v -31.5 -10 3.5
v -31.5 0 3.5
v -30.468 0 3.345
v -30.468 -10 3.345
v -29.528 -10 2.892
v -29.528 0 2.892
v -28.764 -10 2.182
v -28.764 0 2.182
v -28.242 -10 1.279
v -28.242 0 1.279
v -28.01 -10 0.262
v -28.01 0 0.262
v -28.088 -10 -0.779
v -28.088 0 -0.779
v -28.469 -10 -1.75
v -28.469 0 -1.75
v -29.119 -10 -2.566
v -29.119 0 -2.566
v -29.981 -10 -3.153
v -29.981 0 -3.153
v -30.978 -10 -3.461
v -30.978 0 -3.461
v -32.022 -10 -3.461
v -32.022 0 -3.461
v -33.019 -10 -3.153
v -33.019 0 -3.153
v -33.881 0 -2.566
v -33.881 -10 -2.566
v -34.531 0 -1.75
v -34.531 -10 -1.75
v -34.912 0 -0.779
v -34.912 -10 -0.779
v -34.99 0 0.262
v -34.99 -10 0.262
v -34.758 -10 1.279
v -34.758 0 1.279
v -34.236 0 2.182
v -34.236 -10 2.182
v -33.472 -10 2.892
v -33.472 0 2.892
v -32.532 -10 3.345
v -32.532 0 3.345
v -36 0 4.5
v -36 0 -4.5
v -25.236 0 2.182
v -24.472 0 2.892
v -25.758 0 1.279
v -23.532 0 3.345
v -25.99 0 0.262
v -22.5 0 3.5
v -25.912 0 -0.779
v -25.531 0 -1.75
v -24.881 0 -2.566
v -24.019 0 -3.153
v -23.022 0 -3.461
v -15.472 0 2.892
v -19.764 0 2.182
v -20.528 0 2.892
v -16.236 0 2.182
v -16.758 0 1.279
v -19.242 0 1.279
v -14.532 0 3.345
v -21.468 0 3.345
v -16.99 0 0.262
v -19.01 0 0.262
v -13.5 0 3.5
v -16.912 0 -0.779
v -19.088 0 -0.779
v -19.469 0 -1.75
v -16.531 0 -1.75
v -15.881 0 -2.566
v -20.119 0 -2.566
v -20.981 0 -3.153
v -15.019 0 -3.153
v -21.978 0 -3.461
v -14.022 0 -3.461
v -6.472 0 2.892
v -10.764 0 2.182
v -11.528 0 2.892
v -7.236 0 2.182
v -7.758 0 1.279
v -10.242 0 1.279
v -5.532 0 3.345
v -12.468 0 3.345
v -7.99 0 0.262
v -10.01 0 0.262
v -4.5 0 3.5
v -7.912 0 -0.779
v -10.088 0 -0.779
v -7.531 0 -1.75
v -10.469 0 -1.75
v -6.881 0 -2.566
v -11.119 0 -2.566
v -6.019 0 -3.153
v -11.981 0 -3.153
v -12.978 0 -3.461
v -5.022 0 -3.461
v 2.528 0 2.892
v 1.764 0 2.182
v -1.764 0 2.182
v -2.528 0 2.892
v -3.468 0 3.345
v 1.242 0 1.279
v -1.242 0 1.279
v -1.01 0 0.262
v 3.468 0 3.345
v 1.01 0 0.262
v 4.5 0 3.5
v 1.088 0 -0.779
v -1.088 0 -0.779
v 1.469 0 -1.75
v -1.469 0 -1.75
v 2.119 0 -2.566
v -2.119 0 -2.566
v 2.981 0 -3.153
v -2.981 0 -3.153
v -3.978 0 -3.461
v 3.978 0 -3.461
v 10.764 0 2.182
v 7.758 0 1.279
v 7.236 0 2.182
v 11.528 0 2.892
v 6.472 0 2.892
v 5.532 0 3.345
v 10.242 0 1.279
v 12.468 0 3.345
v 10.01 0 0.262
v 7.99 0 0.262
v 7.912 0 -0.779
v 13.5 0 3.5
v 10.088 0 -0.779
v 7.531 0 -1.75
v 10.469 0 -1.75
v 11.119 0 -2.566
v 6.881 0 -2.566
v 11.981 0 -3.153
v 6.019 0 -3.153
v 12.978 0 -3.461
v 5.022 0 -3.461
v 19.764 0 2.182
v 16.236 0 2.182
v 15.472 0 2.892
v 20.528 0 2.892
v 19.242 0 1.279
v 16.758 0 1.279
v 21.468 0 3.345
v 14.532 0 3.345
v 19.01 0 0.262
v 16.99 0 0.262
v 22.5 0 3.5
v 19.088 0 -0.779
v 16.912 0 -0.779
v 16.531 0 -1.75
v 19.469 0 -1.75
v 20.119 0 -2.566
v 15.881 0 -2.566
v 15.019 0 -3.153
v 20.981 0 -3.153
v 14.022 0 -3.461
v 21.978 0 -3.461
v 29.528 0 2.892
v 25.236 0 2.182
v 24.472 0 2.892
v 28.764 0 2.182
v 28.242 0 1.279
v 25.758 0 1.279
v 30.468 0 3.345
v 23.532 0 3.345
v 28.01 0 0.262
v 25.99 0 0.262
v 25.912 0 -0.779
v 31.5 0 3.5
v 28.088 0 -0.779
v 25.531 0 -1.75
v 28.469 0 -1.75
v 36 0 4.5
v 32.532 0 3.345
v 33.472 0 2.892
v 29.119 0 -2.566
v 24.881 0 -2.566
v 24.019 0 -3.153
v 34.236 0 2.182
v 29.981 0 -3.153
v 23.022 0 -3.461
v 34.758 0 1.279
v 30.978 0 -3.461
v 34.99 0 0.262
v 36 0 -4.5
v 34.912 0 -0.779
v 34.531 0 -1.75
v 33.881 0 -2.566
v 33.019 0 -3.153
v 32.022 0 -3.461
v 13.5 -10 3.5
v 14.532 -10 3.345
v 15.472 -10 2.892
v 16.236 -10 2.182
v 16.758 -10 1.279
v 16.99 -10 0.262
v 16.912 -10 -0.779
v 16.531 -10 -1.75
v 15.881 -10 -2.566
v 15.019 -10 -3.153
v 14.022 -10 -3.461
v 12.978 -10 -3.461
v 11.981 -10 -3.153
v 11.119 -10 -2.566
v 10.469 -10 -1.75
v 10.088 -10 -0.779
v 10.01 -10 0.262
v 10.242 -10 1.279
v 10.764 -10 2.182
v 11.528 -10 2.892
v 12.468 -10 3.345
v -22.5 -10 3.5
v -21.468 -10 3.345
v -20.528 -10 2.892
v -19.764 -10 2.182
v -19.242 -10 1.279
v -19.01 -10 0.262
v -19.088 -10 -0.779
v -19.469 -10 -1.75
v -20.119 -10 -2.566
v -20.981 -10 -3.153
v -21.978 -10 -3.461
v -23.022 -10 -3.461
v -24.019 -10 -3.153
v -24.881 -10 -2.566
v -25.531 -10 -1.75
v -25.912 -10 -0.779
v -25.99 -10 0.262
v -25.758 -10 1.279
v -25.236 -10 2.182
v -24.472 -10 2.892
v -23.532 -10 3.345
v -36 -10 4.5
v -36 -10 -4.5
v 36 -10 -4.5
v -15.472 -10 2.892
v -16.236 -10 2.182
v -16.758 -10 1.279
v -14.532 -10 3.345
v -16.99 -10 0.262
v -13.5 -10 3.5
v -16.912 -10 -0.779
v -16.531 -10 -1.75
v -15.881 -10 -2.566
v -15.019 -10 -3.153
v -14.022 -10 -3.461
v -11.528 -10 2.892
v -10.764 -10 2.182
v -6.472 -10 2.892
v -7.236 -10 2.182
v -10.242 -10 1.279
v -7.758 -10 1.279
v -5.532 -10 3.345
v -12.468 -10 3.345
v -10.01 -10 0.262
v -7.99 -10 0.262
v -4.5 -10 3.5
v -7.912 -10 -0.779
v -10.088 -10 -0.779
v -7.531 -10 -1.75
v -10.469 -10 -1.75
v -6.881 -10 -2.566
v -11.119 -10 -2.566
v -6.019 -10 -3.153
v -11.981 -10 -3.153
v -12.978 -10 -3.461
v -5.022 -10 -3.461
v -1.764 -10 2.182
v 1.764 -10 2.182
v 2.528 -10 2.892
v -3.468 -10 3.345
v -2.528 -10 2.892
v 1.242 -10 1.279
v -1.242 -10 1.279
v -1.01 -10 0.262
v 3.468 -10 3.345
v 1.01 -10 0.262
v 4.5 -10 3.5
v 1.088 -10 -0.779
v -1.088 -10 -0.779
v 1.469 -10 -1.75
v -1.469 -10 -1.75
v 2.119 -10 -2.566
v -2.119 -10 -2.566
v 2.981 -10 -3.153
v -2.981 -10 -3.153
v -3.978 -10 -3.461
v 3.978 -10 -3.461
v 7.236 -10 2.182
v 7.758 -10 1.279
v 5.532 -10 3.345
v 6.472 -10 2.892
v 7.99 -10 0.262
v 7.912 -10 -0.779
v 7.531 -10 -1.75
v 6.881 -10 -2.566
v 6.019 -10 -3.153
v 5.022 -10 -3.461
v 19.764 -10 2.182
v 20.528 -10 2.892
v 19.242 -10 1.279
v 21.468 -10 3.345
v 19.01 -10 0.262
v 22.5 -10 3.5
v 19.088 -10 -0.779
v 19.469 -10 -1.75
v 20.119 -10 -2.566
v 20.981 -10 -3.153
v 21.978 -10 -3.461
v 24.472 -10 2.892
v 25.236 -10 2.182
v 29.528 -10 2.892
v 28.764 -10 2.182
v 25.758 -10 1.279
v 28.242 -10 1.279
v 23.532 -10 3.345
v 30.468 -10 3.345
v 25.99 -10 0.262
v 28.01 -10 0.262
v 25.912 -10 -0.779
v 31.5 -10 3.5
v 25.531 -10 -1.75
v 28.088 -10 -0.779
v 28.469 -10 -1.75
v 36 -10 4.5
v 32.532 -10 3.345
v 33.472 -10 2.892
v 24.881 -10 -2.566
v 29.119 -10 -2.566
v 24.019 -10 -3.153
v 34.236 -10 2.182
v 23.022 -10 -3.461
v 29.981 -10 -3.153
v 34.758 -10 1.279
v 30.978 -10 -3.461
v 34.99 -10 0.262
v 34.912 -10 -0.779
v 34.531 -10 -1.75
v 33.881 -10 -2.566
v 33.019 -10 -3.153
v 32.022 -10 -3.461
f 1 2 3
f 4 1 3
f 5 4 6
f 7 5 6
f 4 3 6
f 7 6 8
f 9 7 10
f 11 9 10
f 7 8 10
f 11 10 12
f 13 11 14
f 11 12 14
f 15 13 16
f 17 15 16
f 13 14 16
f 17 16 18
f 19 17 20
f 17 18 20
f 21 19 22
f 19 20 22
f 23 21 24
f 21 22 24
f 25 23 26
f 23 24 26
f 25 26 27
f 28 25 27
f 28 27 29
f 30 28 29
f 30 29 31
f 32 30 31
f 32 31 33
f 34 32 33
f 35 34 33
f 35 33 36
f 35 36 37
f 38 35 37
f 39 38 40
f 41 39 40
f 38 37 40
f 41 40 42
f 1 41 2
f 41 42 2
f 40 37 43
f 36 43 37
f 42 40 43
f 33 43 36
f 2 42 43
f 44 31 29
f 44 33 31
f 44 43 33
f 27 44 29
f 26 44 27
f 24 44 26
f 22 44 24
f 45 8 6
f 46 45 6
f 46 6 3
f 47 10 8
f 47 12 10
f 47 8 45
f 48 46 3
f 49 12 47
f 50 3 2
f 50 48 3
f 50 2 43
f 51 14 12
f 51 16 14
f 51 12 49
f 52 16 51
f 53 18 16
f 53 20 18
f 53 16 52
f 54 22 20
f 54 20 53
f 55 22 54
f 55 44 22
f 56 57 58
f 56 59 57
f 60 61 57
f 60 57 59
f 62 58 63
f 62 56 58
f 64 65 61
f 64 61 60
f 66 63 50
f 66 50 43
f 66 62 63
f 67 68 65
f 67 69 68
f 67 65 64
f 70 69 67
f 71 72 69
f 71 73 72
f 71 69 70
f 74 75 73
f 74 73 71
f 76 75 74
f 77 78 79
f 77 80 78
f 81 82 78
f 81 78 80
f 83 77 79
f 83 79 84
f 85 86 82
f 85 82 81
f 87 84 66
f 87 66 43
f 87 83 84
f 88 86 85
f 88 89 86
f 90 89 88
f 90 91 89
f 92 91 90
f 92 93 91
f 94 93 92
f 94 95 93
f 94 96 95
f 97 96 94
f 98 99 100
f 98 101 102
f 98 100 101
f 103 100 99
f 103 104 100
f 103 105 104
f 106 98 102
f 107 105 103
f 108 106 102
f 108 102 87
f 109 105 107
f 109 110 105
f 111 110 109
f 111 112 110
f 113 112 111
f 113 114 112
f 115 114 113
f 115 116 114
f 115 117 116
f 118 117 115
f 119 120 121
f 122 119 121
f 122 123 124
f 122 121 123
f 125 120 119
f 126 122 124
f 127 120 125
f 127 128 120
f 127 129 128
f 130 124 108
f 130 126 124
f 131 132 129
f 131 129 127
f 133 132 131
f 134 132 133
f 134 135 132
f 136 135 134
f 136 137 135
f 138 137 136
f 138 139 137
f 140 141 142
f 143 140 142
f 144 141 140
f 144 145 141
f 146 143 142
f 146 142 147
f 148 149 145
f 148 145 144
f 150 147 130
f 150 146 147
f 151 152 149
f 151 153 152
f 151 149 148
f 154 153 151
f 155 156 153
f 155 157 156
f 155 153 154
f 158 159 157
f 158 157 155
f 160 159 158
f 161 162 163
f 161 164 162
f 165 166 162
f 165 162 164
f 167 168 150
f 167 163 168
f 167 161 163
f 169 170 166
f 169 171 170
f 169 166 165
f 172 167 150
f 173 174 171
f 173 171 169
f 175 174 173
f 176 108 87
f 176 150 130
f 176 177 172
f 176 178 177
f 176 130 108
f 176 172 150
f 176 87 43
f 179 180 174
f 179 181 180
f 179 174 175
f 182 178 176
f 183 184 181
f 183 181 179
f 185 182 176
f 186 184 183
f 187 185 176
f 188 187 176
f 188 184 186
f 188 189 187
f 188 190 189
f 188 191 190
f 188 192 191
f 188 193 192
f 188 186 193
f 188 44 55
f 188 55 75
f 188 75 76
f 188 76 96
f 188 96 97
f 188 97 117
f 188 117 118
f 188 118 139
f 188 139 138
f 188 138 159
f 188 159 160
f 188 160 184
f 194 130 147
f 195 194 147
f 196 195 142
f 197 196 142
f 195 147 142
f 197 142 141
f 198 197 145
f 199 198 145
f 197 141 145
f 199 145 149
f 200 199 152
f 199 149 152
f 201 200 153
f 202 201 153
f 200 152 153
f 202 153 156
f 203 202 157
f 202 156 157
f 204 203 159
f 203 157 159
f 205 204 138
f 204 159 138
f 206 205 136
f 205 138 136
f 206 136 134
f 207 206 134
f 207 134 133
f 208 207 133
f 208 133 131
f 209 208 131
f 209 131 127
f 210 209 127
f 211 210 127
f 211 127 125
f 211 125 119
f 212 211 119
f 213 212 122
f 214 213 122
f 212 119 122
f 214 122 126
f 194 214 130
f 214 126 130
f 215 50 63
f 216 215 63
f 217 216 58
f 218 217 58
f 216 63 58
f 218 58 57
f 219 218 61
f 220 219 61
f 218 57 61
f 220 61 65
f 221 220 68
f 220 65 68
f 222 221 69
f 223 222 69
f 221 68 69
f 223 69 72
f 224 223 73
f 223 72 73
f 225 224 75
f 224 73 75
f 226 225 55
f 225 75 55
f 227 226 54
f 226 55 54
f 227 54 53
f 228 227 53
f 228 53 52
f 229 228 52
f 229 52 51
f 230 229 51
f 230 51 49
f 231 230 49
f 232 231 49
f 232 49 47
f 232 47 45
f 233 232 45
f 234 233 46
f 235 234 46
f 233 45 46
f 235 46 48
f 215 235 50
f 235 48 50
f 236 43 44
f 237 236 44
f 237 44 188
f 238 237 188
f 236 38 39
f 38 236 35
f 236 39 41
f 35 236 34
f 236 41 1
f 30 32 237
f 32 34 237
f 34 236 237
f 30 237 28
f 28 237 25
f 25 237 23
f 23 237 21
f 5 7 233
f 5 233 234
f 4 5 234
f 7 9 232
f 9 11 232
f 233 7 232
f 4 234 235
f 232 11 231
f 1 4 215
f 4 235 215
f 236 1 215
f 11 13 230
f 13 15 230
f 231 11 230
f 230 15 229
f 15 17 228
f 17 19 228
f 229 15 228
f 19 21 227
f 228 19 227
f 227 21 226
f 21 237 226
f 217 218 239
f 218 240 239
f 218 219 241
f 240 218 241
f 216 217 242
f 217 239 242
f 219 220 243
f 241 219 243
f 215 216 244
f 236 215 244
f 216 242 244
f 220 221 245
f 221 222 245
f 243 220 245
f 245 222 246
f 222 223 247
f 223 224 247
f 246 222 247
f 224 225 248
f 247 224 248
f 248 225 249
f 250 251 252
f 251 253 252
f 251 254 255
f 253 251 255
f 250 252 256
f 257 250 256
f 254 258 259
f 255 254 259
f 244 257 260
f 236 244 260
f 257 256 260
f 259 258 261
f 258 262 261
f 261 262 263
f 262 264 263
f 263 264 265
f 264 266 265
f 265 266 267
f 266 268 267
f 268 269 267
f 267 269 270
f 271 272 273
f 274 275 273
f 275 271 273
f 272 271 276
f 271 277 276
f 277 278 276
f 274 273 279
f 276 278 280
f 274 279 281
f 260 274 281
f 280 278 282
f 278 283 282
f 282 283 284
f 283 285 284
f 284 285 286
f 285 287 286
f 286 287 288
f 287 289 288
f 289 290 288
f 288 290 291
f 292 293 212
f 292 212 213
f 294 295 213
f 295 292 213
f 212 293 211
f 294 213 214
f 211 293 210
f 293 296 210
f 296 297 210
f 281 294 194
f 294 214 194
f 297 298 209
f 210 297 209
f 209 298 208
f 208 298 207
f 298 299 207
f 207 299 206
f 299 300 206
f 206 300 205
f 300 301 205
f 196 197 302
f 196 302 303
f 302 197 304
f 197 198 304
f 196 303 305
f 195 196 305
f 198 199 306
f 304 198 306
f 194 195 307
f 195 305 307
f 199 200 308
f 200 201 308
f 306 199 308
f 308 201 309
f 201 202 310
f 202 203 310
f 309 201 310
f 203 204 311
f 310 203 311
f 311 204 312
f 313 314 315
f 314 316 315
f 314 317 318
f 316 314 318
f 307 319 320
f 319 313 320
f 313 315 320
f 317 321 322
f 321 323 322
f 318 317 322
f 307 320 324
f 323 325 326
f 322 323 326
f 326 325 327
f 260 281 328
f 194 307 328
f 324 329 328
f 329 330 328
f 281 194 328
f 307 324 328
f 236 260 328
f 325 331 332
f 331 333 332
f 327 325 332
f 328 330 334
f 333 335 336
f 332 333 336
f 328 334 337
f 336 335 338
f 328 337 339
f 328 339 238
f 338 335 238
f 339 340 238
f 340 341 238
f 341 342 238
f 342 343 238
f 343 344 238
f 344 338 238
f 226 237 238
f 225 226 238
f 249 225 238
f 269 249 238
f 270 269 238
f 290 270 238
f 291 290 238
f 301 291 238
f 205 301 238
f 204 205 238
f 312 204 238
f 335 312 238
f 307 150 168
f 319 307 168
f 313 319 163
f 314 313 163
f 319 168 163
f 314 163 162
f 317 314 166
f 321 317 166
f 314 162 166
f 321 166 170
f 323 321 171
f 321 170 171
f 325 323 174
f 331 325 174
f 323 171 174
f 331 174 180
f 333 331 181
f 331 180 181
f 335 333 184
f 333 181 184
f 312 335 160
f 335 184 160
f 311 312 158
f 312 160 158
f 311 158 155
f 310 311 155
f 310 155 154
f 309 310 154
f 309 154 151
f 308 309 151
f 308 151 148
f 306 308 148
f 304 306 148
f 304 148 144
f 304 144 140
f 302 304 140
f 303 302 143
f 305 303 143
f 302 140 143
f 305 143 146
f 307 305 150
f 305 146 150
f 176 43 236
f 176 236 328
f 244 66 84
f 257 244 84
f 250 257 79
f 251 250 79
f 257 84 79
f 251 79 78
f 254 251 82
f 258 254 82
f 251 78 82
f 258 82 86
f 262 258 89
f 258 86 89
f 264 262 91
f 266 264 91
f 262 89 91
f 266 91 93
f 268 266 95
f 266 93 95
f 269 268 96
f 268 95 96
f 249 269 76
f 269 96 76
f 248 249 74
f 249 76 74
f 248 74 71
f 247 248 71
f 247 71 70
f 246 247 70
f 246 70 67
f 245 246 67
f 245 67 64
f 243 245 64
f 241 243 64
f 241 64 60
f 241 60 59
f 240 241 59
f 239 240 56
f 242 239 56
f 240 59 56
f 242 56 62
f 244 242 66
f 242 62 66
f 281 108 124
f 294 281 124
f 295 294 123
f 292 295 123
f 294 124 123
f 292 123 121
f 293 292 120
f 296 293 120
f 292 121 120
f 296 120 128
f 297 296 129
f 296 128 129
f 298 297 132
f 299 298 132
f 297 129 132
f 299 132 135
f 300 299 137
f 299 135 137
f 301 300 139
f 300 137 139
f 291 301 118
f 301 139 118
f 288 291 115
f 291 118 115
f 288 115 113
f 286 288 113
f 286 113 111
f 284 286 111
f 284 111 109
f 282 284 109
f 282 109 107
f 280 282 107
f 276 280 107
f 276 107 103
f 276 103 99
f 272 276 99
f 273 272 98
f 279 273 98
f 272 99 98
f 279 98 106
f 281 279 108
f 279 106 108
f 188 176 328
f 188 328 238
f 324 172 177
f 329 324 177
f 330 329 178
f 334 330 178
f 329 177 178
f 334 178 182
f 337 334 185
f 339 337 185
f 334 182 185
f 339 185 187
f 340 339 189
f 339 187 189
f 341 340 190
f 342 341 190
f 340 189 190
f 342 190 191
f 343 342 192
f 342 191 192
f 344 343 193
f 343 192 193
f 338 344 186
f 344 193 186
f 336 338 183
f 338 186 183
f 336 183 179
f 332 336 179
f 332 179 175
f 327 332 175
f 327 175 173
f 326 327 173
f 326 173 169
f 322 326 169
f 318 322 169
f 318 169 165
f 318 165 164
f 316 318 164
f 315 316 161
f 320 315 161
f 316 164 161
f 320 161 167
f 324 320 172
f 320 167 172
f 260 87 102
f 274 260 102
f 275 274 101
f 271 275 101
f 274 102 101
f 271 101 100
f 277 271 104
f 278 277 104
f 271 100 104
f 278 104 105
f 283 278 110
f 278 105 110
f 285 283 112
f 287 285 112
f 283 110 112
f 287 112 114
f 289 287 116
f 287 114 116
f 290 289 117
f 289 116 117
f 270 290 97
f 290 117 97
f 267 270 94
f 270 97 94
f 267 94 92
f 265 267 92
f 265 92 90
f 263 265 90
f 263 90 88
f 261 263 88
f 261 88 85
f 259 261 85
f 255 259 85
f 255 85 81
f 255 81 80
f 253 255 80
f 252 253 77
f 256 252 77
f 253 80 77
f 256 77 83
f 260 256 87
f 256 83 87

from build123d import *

# Parameters (mm, degrees)
SKETCH1_W           = 72
SKETCH1_H           = 9
SKETCH1_R           = 3.5
BOSS_EXTRUDE1_DEPTH = 10


with BuildPart() as part:
    # Sketch1 → Boss-Extrude1 (new body)
    with BuildSketch(Plane(origin=(0, 0, 0), x_dir=(1, 0, 0), z_dir=(0, 1, 0))):
        Rectangle(SKETCH1_W, SKETCH1_H)
        with Locations(Location((-4.5, 0, 0), (0, 0, 270))):
            Circle(SKETCH1_R, mode=Mode.SUBTRACT)
        with Locations(Location((4.5, 0, 0), (0, 0, 270))):
            Circle(SKETCH1_R, mode=Mode.SUBTRACT)
        with Locations(Location((13.5, 0, 0), (0, 0, 270))):
            Circle(SKETCH1_R, mode=Mode.SUBTRACT)
        with Locations(Location((22.5, 0, 0), (0, 0, 270))):
            Circle(SKETCH1_R, mode=Mode.SUBTRACT)
        with Locations(Location((31.5, 0, 0), (0, 0, 270))):
            Circle(SKETCH1_R, mode=Mode.SUBTRACT)
        with Locations(Location((-13.5, 0, 0), (0, 0, 270))):
            Circle(SKETCH1_R, mode=Mode.SUBTRACT)
        with Locations(Location((-22.5, 0, 0), (0, 0, 270))):
            Circle(SKETCH1_R, mode=Mode.SUBTRACT)
        with Locations(Location((-31.5, 0, 0), (0, 0, 270))):
            Circle(SKETCH1_R, mode=Mode.SUBTRACT)
    extrude(amount=-BOSS_EXTRUDE1_DEPTH)


solid = part.part
